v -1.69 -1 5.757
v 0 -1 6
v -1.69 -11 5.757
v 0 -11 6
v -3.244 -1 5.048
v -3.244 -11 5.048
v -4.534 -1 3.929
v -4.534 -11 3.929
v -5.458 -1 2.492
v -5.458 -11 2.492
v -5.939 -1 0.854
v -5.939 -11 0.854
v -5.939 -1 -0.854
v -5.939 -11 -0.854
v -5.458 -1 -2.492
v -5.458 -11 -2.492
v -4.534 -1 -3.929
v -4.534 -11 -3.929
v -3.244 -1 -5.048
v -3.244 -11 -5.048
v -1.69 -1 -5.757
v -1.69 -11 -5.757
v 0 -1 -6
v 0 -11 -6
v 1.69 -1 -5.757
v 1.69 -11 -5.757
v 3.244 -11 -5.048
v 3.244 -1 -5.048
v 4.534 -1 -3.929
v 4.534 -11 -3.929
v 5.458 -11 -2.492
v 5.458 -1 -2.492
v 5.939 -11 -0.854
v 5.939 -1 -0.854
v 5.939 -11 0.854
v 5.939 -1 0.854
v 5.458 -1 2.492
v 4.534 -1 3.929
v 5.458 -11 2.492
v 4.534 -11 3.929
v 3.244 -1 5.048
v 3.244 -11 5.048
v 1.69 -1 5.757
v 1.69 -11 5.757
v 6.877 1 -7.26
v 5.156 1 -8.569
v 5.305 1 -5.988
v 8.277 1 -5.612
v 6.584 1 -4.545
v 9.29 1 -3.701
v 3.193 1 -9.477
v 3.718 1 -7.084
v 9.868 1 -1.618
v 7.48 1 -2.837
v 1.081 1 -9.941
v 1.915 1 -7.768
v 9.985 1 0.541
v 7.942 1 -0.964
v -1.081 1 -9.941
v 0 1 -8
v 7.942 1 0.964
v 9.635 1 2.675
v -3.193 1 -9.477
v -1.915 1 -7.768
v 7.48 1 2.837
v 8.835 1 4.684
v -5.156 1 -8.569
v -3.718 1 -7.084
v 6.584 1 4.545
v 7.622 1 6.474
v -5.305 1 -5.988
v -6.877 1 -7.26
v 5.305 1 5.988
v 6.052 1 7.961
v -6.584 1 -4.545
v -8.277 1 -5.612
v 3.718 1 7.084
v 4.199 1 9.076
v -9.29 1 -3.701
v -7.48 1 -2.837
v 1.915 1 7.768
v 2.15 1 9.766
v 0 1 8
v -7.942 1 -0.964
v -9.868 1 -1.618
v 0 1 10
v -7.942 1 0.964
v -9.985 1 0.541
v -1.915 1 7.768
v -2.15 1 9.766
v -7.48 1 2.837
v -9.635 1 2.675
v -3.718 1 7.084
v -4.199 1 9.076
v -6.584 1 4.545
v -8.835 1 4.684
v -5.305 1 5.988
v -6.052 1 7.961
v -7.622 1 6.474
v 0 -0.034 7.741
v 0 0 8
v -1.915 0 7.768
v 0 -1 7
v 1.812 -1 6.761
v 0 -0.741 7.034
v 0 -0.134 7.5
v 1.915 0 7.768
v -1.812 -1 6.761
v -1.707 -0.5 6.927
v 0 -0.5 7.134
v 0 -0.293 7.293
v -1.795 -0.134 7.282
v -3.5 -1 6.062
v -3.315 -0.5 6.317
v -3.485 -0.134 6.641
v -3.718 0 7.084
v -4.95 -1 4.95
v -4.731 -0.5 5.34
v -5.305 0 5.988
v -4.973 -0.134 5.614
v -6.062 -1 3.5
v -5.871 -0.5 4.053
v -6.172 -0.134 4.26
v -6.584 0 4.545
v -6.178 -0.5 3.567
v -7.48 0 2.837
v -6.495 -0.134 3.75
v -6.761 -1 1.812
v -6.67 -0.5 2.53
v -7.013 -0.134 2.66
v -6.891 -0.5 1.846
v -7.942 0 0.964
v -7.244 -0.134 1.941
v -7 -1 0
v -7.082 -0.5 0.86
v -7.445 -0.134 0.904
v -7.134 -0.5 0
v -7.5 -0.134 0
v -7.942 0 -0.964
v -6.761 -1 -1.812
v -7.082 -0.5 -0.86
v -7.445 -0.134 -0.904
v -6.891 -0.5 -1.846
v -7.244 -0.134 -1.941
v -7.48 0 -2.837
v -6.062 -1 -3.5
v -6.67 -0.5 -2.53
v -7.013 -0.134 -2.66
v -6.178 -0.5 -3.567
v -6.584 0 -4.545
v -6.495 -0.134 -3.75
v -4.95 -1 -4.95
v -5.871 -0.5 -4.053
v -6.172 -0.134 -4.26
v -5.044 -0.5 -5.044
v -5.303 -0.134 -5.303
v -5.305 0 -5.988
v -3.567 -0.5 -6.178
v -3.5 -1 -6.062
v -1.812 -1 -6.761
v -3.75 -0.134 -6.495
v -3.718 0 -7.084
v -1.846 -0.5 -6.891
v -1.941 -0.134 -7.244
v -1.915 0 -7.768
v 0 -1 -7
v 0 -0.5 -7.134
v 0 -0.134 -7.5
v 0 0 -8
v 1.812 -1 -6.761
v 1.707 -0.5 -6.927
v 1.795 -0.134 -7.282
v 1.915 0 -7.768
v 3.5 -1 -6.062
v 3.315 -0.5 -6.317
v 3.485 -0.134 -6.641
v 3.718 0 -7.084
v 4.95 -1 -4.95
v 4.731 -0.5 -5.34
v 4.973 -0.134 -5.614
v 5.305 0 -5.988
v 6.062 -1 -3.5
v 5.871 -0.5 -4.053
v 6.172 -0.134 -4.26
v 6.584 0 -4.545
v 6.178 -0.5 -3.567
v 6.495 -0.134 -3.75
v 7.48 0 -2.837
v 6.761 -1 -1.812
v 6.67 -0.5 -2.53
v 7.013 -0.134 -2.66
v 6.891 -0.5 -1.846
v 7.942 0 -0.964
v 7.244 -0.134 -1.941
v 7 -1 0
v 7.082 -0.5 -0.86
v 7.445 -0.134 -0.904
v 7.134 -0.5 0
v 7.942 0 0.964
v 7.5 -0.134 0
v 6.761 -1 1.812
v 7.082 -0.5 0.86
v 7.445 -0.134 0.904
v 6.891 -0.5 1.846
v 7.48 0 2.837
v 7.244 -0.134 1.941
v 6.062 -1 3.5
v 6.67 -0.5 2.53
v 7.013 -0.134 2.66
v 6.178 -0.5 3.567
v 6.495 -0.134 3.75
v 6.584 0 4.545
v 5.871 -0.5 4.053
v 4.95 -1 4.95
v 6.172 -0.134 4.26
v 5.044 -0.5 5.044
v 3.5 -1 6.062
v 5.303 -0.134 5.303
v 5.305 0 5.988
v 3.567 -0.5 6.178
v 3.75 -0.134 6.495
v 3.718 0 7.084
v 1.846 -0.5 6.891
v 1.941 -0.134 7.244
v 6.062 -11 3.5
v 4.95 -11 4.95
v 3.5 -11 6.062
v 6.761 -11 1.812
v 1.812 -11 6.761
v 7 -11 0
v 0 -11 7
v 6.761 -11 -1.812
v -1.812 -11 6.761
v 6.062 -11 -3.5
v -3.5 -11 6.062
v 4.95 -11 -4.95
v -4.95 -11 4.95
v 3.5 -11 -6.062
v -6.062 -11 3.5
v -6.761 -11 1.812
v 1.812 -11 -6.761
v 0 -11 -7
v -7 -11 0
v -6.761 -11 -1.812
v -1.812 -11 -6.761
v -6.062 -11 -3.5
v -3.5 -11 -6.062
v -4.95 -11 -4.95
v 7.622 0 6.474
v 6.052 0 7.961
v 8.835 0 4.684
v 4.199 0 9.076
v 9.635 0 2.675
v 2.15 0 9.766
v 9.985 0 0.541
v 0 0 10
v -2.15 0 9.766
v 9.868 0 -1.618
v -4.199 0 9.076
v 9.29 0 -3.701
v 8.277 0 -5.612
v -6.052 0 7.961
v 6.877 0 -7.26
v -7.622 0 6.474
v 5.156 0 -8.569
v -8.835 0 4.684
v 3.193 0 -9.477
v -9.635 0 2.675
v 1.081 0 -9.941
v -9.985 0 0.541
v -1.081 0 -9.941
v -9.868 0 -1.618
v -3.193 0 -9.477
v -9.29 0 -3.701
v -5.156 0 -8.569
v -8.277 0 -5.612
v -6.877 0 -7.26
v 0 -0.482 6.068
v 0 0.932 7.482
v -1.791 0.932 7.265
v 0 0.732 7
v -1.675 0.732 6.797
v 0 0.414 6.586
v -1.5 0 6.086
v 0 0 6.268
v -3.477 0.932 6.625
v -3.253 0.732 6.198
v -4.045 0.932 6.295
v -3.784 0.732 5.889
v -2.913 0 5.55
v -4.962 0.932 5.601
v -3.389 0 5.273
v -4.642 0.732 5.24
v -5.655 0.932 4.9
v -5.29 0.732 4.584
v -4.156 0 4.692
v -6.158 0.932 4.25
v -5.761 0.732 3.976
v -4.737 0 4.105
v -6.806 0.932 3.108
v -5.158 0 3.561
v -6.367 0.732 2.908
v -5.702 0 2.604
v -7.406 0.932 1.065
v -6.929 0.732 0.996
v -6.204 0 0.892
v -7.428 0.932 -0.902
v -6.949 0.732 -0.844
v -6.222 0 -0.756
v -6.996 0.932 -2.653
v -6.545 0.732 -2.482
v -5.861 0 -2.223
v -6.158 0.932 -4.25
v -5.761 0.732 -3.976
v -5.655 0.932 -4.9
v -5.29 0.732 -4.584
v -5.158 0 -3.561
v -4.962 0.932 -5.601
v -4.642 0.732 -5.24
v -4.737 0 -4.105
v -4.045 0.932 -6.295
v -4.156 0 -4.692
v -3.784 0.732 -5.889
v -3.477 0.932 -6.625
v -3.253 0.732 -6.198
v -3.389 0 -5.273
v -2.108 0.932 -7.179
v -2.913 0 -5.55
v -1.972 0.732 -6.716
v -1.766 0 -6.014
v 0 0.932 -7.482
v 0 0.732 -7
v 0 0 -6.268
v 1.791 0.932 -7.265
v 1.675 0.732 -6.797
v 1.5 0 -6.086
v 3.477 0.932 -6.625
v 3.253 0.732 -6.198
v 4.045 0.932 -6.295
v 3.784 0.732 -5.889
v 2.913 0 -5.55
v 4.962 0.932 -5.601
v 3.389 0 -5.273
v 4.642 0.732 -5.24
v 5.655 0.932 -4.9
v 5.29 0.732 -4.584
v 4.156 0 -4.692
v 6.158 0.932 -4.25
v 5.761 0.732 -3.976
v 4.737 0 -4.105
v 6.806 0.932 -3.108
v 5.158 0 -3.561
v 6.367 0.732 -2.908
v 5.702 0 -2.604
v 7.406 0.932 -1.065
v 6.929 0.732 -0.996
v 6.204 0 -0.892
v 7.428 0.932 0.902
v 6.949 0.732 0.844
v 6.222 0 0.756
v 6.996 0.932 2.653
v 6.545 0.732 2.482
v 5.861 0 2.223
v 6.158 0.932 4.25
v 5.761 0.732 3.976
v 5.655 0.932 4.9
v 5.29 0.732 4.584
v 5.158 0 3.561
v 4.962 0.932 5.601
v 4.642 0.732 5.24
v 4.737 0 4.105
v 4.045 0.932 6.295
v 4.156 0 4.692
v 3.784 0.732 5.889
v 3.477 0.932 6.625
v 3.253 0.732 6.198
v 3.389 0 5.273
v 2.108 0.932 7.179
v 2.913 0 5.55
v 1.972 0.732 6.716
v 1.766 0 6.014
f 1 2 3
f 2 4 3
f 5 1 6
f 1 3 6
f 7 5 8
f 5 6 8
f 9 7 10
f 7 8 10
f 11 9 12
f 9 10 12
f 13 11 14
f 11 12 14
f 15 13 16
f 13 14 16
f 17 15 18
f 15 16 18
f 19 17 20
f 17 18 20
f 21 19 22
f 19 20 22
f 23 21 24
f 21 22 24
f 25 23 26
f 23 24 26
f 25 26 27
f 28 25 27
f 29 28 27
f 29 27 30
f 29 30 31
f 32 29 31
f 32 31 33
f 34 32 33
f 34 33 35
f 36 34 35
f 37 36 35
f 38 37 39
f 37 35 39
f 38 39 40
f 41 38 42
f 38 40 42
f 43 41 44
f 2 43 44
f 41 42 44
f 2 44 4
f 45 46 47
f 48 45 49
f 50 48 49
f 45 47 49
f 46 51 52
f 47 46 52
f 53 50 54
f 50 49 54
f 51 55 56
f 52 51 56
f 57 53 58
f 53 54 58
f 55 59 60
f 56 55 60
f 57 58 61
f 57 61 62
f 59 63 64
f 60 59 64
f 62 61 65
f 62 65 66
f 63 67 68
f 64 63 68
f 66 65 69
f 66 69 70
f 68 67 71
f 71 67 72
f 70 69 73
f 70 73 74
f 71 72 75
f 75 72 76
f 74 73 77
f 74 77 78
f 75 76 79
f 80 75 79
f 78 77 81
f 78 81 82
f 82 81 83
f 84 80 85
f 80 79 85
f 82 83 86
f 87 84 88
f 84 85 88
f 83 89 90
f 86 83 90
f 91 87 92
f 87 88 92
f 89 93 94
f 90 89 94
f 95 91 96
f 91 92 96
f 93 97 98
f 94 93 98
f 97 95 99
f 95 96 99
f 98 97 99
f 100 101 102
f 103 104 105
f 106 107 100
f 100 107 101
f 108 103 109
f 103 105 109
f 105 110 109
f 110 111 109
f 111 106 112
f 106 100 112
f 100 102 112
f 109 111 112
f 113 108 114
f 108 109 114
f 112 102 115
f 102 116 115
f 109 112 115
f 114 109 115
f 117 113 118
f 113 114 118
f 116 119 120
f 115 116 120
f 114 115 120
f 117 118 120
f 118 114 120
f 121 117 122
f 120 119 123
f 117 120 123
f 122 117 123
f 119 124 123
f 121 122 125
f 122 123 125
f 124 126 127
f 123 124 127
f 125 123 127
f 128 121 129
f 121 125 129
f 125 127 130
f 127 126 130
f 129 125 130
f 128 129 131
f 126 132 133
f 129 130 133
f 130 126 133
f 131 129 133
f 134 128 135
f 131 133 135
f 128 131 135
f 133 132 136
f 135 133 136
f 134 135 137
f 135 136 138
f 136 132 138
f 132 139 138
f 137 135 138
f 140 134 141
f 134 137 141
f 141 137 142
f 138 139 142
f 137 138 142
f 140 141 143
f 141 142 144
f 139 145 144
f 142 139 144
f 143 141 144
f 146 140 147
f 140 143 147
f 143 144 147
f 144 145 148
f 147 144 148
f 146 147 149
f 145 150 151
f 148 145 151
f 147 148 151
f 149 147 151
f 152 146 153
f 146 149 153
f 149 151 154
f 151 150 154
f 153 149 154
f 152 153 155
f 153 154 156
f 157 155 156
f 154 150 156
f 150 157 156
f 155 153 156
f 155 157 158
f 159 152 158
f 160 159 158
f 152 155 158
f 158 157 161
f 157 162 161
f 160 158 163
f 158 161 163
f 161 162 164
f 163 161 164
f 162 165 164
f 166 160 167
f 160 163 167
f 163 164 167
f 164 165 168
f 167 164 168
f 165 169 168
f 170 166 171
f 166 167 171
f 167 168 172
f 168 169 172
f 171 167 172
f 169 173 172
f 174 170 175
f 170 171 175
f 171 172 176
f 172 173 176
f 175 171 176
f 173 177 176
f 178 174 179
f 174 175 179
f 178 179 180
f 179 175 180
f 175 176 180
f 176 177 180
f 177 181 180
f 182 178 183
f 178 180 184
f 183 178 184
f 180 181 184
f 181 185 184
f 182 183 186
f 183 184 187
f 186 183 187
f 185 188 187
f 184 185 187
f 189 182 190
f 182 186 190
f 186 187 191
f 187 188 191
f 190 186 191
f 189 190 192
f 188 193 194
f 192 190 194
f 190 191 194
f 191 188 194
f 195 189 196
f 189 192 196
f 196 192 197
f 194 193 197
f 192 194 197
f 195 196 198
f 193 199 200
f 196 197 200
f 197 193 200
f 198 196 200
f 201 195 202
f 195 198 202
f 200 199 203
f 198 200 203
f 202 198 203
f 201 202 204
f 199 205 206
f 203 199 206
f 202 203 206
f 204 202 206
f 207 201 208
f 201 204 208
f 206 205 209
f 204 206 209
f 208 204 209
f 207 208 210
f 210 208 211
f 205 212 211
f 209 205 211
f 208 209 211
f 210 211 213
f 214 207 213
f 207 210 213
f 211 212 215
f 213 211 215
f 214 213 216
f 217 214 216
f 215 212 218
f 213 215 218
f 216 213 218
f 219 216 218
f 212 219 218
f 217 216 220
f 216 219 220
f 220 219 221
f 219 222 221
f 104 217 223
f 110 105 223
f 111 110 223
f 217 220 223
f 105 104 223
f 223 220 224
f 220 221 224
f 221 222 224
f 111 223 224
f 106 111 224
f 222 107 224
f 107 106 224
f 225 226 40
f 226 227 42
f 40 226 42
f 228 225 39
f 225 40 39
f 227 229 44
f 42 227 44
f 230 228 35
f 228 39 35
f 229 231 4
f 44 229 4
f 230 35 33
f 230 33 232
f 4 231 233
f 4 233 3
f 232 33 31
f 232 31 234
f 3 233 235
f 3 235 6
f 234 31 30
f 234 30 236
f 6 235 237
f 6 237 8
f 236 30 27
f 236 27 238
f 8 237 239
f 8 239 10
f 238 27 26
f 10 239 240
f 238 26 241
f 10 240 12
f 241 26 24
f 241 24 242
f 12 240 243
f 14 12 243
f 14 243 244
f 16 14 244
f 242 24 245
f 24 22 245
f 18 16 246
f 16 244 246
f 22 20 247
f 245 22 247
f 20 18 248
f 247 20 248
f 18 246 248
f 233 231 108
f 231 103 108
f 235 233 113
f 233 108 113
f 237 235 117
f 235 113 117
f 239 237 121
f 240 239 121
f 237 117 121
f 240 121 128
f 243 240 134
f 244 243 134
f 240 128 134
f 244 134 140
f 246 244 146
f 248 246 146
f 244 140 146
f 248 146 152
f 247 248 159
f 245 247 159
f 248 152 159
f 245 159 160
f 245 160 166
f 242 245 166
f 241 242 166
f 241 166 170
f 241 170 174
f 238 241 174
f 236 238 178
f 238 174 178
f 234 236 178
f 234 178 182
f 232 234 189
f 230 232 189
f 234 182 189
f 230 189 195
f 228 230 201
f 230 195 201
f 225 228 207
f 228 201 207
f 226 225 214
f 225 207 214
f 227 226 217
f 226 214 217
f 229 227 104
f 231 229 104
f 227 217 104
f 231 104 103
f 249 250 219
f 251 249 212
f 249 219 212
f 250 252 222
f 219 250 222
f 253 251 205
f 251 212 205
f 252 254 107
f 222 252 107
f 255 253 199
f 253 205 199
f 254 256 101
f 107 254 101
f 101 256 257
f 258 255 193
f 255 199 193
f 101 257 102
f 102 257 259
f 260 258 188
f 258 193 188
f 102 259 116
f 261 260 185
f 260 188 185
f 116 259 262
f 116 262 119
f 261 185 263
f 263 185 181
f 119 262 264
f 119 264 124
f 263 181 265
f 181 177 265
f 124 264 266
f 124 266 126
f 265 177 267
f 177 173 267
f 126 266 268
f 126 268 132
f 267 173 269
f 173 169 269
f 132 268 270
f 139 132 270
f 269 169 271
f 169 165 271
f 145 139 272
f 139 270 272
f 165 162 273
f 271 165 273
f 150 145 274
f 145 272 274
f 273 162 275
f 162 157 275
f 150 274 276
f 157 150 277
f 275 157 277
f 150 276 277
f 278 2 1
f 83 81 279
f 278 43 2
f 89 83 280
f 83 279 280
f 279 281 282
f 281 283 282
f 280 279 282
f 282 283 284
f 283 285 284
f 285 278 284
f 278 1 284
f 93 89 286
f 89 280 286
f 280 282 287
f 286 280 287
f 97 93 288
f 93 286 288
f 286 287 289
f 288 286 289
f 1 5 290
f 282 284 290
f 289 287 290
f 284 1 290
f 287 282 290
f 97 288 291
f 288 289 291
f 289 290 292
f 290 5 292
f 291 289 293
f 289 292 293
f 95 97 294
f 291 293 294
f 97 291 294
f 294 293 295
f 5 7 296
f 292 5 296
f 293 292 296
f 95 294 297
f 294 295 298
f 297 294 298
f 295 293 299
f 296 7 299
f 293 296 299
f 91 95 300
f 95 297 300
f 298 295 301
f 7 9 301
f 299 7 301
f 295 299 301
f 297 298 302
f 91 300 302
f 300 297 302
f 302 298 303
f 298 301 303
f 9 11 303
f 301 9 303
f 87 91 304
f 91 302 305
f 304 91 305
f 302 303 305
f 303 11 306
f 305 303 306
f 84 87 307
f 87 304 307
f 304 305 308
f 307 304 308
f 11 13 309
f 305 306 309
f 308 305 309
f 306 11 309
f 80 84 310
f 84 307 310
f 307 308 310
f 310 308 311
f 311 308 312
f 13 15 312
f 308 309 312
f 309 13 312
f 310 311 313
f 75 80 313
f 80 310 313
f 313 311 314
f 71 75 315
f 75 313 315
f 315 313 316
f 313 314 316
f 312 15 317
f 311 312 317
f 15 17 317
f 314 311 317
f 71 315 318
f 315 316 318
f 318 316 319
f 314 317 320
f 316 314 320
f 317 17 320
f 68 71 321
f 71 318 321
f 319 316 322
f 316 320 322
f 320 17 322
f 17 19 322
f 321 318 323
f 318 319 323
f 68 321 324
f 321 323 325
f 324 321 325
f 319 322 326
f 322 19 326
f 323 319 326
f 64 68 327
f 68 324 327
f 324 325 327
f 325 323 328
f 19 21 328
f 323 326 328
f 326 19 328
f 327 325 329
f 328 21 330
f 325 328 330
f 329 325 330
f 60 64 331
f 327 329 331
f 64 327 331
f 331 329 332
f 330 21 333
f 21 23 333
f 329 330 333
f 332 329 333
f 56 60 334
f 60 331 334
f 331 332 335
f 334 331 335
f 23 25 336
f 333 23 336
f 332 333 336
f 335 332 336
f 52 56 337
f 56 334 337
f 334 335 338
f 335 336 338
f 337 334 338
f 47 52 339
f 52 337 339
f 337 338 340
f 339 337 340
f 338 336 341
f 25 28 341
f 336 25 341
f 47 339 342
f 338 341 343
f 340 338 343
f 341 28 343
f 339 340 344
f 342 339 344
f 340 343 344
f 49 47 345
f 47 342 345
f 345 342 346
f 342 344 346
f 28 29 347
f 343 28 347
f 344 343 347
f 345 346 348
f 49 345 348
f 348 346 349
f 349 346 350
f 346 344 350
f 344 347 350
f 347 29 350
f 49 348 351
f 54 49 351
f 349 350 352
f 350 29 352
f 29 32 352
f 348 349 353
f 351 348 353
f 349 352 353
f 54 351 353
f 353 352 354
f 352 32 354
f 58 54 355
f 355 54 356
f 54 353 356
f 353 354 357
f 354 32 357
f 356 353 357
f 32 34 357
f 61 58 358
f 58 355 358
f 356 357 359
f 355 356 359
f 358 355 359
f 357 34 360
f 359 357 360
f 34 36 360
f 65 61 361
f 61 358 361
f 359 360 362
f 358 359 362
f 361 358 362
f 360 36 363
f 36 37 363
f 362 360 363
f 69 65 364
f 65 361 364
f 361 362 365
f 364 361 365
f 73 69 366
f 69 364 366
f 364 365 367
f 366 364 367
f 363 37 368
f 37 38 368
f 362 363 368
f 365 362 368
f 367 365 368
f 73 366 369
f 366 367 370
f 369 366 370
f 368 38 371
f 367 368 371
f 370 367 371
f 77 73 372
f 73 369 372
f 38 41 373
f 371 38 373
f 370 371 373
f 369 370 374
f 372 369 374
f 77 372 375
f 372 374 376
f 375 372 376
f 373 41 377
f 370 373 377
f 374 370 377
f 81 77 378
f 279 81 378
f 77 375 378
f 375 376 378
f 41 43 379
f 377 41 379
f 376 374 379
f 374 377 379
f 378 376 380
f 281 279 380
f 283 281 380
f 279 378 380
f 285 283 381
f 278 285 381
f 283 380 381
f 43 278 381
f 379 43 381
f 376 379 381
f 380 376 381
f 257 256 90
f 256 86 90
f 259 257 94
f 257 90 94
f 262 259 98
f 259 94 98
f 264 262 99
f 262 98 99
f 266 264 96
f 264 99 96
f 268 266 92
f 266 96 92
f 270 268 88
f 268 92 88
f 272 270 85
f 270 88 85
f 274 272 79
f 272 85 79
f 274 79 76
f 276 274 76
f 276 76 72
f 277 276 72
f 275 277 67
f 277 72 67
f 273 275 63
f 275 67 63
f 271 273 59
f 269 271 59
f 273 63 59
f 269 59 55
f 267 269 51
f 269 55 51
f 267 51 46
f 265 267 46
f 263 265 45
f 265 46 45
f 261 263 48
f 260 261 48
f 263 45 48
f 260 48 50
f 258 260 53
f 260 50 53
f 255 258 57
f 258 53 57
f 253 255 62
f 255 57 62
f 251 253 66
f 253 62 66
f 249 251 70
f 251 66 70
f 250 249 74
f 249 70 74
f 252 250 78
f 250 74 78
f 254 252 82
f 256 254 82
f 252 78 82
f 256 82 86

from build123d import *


with BuildPart() as part:
    # Skizze1 → Basis-Rotation (revolve)
    with BuildSketch(Plane.XY, mode=Mode.PRIVATE) as basis_rotation_sk:
        with BuildLine():
            Line((-6, -11), (-7, -11))
            Line((-7, -11), (-7, -1))
            ThreePointArc((-7, -1), (-7.292893219, -0.292893219), (-8, 0))
            Line((-8, 0), (-10, 0))
            Line((-10, 0), (-10, 1))
            Line((-10, 1), (-8, 1))
            ThreePointArc((-8, 1), (-6.585786438, 0.414213562), (-6, -1))
            Line((-6, -1), (-6, -11))
        make_face()
    revolve(basis_rotation_sk.sketch.rotate(Axis((0, 7.790971461, 0), (0, -1, 0)), 270), axis=Axis((0, 7.790971461, 0), (0, -1, 0)))


solid = part.part
